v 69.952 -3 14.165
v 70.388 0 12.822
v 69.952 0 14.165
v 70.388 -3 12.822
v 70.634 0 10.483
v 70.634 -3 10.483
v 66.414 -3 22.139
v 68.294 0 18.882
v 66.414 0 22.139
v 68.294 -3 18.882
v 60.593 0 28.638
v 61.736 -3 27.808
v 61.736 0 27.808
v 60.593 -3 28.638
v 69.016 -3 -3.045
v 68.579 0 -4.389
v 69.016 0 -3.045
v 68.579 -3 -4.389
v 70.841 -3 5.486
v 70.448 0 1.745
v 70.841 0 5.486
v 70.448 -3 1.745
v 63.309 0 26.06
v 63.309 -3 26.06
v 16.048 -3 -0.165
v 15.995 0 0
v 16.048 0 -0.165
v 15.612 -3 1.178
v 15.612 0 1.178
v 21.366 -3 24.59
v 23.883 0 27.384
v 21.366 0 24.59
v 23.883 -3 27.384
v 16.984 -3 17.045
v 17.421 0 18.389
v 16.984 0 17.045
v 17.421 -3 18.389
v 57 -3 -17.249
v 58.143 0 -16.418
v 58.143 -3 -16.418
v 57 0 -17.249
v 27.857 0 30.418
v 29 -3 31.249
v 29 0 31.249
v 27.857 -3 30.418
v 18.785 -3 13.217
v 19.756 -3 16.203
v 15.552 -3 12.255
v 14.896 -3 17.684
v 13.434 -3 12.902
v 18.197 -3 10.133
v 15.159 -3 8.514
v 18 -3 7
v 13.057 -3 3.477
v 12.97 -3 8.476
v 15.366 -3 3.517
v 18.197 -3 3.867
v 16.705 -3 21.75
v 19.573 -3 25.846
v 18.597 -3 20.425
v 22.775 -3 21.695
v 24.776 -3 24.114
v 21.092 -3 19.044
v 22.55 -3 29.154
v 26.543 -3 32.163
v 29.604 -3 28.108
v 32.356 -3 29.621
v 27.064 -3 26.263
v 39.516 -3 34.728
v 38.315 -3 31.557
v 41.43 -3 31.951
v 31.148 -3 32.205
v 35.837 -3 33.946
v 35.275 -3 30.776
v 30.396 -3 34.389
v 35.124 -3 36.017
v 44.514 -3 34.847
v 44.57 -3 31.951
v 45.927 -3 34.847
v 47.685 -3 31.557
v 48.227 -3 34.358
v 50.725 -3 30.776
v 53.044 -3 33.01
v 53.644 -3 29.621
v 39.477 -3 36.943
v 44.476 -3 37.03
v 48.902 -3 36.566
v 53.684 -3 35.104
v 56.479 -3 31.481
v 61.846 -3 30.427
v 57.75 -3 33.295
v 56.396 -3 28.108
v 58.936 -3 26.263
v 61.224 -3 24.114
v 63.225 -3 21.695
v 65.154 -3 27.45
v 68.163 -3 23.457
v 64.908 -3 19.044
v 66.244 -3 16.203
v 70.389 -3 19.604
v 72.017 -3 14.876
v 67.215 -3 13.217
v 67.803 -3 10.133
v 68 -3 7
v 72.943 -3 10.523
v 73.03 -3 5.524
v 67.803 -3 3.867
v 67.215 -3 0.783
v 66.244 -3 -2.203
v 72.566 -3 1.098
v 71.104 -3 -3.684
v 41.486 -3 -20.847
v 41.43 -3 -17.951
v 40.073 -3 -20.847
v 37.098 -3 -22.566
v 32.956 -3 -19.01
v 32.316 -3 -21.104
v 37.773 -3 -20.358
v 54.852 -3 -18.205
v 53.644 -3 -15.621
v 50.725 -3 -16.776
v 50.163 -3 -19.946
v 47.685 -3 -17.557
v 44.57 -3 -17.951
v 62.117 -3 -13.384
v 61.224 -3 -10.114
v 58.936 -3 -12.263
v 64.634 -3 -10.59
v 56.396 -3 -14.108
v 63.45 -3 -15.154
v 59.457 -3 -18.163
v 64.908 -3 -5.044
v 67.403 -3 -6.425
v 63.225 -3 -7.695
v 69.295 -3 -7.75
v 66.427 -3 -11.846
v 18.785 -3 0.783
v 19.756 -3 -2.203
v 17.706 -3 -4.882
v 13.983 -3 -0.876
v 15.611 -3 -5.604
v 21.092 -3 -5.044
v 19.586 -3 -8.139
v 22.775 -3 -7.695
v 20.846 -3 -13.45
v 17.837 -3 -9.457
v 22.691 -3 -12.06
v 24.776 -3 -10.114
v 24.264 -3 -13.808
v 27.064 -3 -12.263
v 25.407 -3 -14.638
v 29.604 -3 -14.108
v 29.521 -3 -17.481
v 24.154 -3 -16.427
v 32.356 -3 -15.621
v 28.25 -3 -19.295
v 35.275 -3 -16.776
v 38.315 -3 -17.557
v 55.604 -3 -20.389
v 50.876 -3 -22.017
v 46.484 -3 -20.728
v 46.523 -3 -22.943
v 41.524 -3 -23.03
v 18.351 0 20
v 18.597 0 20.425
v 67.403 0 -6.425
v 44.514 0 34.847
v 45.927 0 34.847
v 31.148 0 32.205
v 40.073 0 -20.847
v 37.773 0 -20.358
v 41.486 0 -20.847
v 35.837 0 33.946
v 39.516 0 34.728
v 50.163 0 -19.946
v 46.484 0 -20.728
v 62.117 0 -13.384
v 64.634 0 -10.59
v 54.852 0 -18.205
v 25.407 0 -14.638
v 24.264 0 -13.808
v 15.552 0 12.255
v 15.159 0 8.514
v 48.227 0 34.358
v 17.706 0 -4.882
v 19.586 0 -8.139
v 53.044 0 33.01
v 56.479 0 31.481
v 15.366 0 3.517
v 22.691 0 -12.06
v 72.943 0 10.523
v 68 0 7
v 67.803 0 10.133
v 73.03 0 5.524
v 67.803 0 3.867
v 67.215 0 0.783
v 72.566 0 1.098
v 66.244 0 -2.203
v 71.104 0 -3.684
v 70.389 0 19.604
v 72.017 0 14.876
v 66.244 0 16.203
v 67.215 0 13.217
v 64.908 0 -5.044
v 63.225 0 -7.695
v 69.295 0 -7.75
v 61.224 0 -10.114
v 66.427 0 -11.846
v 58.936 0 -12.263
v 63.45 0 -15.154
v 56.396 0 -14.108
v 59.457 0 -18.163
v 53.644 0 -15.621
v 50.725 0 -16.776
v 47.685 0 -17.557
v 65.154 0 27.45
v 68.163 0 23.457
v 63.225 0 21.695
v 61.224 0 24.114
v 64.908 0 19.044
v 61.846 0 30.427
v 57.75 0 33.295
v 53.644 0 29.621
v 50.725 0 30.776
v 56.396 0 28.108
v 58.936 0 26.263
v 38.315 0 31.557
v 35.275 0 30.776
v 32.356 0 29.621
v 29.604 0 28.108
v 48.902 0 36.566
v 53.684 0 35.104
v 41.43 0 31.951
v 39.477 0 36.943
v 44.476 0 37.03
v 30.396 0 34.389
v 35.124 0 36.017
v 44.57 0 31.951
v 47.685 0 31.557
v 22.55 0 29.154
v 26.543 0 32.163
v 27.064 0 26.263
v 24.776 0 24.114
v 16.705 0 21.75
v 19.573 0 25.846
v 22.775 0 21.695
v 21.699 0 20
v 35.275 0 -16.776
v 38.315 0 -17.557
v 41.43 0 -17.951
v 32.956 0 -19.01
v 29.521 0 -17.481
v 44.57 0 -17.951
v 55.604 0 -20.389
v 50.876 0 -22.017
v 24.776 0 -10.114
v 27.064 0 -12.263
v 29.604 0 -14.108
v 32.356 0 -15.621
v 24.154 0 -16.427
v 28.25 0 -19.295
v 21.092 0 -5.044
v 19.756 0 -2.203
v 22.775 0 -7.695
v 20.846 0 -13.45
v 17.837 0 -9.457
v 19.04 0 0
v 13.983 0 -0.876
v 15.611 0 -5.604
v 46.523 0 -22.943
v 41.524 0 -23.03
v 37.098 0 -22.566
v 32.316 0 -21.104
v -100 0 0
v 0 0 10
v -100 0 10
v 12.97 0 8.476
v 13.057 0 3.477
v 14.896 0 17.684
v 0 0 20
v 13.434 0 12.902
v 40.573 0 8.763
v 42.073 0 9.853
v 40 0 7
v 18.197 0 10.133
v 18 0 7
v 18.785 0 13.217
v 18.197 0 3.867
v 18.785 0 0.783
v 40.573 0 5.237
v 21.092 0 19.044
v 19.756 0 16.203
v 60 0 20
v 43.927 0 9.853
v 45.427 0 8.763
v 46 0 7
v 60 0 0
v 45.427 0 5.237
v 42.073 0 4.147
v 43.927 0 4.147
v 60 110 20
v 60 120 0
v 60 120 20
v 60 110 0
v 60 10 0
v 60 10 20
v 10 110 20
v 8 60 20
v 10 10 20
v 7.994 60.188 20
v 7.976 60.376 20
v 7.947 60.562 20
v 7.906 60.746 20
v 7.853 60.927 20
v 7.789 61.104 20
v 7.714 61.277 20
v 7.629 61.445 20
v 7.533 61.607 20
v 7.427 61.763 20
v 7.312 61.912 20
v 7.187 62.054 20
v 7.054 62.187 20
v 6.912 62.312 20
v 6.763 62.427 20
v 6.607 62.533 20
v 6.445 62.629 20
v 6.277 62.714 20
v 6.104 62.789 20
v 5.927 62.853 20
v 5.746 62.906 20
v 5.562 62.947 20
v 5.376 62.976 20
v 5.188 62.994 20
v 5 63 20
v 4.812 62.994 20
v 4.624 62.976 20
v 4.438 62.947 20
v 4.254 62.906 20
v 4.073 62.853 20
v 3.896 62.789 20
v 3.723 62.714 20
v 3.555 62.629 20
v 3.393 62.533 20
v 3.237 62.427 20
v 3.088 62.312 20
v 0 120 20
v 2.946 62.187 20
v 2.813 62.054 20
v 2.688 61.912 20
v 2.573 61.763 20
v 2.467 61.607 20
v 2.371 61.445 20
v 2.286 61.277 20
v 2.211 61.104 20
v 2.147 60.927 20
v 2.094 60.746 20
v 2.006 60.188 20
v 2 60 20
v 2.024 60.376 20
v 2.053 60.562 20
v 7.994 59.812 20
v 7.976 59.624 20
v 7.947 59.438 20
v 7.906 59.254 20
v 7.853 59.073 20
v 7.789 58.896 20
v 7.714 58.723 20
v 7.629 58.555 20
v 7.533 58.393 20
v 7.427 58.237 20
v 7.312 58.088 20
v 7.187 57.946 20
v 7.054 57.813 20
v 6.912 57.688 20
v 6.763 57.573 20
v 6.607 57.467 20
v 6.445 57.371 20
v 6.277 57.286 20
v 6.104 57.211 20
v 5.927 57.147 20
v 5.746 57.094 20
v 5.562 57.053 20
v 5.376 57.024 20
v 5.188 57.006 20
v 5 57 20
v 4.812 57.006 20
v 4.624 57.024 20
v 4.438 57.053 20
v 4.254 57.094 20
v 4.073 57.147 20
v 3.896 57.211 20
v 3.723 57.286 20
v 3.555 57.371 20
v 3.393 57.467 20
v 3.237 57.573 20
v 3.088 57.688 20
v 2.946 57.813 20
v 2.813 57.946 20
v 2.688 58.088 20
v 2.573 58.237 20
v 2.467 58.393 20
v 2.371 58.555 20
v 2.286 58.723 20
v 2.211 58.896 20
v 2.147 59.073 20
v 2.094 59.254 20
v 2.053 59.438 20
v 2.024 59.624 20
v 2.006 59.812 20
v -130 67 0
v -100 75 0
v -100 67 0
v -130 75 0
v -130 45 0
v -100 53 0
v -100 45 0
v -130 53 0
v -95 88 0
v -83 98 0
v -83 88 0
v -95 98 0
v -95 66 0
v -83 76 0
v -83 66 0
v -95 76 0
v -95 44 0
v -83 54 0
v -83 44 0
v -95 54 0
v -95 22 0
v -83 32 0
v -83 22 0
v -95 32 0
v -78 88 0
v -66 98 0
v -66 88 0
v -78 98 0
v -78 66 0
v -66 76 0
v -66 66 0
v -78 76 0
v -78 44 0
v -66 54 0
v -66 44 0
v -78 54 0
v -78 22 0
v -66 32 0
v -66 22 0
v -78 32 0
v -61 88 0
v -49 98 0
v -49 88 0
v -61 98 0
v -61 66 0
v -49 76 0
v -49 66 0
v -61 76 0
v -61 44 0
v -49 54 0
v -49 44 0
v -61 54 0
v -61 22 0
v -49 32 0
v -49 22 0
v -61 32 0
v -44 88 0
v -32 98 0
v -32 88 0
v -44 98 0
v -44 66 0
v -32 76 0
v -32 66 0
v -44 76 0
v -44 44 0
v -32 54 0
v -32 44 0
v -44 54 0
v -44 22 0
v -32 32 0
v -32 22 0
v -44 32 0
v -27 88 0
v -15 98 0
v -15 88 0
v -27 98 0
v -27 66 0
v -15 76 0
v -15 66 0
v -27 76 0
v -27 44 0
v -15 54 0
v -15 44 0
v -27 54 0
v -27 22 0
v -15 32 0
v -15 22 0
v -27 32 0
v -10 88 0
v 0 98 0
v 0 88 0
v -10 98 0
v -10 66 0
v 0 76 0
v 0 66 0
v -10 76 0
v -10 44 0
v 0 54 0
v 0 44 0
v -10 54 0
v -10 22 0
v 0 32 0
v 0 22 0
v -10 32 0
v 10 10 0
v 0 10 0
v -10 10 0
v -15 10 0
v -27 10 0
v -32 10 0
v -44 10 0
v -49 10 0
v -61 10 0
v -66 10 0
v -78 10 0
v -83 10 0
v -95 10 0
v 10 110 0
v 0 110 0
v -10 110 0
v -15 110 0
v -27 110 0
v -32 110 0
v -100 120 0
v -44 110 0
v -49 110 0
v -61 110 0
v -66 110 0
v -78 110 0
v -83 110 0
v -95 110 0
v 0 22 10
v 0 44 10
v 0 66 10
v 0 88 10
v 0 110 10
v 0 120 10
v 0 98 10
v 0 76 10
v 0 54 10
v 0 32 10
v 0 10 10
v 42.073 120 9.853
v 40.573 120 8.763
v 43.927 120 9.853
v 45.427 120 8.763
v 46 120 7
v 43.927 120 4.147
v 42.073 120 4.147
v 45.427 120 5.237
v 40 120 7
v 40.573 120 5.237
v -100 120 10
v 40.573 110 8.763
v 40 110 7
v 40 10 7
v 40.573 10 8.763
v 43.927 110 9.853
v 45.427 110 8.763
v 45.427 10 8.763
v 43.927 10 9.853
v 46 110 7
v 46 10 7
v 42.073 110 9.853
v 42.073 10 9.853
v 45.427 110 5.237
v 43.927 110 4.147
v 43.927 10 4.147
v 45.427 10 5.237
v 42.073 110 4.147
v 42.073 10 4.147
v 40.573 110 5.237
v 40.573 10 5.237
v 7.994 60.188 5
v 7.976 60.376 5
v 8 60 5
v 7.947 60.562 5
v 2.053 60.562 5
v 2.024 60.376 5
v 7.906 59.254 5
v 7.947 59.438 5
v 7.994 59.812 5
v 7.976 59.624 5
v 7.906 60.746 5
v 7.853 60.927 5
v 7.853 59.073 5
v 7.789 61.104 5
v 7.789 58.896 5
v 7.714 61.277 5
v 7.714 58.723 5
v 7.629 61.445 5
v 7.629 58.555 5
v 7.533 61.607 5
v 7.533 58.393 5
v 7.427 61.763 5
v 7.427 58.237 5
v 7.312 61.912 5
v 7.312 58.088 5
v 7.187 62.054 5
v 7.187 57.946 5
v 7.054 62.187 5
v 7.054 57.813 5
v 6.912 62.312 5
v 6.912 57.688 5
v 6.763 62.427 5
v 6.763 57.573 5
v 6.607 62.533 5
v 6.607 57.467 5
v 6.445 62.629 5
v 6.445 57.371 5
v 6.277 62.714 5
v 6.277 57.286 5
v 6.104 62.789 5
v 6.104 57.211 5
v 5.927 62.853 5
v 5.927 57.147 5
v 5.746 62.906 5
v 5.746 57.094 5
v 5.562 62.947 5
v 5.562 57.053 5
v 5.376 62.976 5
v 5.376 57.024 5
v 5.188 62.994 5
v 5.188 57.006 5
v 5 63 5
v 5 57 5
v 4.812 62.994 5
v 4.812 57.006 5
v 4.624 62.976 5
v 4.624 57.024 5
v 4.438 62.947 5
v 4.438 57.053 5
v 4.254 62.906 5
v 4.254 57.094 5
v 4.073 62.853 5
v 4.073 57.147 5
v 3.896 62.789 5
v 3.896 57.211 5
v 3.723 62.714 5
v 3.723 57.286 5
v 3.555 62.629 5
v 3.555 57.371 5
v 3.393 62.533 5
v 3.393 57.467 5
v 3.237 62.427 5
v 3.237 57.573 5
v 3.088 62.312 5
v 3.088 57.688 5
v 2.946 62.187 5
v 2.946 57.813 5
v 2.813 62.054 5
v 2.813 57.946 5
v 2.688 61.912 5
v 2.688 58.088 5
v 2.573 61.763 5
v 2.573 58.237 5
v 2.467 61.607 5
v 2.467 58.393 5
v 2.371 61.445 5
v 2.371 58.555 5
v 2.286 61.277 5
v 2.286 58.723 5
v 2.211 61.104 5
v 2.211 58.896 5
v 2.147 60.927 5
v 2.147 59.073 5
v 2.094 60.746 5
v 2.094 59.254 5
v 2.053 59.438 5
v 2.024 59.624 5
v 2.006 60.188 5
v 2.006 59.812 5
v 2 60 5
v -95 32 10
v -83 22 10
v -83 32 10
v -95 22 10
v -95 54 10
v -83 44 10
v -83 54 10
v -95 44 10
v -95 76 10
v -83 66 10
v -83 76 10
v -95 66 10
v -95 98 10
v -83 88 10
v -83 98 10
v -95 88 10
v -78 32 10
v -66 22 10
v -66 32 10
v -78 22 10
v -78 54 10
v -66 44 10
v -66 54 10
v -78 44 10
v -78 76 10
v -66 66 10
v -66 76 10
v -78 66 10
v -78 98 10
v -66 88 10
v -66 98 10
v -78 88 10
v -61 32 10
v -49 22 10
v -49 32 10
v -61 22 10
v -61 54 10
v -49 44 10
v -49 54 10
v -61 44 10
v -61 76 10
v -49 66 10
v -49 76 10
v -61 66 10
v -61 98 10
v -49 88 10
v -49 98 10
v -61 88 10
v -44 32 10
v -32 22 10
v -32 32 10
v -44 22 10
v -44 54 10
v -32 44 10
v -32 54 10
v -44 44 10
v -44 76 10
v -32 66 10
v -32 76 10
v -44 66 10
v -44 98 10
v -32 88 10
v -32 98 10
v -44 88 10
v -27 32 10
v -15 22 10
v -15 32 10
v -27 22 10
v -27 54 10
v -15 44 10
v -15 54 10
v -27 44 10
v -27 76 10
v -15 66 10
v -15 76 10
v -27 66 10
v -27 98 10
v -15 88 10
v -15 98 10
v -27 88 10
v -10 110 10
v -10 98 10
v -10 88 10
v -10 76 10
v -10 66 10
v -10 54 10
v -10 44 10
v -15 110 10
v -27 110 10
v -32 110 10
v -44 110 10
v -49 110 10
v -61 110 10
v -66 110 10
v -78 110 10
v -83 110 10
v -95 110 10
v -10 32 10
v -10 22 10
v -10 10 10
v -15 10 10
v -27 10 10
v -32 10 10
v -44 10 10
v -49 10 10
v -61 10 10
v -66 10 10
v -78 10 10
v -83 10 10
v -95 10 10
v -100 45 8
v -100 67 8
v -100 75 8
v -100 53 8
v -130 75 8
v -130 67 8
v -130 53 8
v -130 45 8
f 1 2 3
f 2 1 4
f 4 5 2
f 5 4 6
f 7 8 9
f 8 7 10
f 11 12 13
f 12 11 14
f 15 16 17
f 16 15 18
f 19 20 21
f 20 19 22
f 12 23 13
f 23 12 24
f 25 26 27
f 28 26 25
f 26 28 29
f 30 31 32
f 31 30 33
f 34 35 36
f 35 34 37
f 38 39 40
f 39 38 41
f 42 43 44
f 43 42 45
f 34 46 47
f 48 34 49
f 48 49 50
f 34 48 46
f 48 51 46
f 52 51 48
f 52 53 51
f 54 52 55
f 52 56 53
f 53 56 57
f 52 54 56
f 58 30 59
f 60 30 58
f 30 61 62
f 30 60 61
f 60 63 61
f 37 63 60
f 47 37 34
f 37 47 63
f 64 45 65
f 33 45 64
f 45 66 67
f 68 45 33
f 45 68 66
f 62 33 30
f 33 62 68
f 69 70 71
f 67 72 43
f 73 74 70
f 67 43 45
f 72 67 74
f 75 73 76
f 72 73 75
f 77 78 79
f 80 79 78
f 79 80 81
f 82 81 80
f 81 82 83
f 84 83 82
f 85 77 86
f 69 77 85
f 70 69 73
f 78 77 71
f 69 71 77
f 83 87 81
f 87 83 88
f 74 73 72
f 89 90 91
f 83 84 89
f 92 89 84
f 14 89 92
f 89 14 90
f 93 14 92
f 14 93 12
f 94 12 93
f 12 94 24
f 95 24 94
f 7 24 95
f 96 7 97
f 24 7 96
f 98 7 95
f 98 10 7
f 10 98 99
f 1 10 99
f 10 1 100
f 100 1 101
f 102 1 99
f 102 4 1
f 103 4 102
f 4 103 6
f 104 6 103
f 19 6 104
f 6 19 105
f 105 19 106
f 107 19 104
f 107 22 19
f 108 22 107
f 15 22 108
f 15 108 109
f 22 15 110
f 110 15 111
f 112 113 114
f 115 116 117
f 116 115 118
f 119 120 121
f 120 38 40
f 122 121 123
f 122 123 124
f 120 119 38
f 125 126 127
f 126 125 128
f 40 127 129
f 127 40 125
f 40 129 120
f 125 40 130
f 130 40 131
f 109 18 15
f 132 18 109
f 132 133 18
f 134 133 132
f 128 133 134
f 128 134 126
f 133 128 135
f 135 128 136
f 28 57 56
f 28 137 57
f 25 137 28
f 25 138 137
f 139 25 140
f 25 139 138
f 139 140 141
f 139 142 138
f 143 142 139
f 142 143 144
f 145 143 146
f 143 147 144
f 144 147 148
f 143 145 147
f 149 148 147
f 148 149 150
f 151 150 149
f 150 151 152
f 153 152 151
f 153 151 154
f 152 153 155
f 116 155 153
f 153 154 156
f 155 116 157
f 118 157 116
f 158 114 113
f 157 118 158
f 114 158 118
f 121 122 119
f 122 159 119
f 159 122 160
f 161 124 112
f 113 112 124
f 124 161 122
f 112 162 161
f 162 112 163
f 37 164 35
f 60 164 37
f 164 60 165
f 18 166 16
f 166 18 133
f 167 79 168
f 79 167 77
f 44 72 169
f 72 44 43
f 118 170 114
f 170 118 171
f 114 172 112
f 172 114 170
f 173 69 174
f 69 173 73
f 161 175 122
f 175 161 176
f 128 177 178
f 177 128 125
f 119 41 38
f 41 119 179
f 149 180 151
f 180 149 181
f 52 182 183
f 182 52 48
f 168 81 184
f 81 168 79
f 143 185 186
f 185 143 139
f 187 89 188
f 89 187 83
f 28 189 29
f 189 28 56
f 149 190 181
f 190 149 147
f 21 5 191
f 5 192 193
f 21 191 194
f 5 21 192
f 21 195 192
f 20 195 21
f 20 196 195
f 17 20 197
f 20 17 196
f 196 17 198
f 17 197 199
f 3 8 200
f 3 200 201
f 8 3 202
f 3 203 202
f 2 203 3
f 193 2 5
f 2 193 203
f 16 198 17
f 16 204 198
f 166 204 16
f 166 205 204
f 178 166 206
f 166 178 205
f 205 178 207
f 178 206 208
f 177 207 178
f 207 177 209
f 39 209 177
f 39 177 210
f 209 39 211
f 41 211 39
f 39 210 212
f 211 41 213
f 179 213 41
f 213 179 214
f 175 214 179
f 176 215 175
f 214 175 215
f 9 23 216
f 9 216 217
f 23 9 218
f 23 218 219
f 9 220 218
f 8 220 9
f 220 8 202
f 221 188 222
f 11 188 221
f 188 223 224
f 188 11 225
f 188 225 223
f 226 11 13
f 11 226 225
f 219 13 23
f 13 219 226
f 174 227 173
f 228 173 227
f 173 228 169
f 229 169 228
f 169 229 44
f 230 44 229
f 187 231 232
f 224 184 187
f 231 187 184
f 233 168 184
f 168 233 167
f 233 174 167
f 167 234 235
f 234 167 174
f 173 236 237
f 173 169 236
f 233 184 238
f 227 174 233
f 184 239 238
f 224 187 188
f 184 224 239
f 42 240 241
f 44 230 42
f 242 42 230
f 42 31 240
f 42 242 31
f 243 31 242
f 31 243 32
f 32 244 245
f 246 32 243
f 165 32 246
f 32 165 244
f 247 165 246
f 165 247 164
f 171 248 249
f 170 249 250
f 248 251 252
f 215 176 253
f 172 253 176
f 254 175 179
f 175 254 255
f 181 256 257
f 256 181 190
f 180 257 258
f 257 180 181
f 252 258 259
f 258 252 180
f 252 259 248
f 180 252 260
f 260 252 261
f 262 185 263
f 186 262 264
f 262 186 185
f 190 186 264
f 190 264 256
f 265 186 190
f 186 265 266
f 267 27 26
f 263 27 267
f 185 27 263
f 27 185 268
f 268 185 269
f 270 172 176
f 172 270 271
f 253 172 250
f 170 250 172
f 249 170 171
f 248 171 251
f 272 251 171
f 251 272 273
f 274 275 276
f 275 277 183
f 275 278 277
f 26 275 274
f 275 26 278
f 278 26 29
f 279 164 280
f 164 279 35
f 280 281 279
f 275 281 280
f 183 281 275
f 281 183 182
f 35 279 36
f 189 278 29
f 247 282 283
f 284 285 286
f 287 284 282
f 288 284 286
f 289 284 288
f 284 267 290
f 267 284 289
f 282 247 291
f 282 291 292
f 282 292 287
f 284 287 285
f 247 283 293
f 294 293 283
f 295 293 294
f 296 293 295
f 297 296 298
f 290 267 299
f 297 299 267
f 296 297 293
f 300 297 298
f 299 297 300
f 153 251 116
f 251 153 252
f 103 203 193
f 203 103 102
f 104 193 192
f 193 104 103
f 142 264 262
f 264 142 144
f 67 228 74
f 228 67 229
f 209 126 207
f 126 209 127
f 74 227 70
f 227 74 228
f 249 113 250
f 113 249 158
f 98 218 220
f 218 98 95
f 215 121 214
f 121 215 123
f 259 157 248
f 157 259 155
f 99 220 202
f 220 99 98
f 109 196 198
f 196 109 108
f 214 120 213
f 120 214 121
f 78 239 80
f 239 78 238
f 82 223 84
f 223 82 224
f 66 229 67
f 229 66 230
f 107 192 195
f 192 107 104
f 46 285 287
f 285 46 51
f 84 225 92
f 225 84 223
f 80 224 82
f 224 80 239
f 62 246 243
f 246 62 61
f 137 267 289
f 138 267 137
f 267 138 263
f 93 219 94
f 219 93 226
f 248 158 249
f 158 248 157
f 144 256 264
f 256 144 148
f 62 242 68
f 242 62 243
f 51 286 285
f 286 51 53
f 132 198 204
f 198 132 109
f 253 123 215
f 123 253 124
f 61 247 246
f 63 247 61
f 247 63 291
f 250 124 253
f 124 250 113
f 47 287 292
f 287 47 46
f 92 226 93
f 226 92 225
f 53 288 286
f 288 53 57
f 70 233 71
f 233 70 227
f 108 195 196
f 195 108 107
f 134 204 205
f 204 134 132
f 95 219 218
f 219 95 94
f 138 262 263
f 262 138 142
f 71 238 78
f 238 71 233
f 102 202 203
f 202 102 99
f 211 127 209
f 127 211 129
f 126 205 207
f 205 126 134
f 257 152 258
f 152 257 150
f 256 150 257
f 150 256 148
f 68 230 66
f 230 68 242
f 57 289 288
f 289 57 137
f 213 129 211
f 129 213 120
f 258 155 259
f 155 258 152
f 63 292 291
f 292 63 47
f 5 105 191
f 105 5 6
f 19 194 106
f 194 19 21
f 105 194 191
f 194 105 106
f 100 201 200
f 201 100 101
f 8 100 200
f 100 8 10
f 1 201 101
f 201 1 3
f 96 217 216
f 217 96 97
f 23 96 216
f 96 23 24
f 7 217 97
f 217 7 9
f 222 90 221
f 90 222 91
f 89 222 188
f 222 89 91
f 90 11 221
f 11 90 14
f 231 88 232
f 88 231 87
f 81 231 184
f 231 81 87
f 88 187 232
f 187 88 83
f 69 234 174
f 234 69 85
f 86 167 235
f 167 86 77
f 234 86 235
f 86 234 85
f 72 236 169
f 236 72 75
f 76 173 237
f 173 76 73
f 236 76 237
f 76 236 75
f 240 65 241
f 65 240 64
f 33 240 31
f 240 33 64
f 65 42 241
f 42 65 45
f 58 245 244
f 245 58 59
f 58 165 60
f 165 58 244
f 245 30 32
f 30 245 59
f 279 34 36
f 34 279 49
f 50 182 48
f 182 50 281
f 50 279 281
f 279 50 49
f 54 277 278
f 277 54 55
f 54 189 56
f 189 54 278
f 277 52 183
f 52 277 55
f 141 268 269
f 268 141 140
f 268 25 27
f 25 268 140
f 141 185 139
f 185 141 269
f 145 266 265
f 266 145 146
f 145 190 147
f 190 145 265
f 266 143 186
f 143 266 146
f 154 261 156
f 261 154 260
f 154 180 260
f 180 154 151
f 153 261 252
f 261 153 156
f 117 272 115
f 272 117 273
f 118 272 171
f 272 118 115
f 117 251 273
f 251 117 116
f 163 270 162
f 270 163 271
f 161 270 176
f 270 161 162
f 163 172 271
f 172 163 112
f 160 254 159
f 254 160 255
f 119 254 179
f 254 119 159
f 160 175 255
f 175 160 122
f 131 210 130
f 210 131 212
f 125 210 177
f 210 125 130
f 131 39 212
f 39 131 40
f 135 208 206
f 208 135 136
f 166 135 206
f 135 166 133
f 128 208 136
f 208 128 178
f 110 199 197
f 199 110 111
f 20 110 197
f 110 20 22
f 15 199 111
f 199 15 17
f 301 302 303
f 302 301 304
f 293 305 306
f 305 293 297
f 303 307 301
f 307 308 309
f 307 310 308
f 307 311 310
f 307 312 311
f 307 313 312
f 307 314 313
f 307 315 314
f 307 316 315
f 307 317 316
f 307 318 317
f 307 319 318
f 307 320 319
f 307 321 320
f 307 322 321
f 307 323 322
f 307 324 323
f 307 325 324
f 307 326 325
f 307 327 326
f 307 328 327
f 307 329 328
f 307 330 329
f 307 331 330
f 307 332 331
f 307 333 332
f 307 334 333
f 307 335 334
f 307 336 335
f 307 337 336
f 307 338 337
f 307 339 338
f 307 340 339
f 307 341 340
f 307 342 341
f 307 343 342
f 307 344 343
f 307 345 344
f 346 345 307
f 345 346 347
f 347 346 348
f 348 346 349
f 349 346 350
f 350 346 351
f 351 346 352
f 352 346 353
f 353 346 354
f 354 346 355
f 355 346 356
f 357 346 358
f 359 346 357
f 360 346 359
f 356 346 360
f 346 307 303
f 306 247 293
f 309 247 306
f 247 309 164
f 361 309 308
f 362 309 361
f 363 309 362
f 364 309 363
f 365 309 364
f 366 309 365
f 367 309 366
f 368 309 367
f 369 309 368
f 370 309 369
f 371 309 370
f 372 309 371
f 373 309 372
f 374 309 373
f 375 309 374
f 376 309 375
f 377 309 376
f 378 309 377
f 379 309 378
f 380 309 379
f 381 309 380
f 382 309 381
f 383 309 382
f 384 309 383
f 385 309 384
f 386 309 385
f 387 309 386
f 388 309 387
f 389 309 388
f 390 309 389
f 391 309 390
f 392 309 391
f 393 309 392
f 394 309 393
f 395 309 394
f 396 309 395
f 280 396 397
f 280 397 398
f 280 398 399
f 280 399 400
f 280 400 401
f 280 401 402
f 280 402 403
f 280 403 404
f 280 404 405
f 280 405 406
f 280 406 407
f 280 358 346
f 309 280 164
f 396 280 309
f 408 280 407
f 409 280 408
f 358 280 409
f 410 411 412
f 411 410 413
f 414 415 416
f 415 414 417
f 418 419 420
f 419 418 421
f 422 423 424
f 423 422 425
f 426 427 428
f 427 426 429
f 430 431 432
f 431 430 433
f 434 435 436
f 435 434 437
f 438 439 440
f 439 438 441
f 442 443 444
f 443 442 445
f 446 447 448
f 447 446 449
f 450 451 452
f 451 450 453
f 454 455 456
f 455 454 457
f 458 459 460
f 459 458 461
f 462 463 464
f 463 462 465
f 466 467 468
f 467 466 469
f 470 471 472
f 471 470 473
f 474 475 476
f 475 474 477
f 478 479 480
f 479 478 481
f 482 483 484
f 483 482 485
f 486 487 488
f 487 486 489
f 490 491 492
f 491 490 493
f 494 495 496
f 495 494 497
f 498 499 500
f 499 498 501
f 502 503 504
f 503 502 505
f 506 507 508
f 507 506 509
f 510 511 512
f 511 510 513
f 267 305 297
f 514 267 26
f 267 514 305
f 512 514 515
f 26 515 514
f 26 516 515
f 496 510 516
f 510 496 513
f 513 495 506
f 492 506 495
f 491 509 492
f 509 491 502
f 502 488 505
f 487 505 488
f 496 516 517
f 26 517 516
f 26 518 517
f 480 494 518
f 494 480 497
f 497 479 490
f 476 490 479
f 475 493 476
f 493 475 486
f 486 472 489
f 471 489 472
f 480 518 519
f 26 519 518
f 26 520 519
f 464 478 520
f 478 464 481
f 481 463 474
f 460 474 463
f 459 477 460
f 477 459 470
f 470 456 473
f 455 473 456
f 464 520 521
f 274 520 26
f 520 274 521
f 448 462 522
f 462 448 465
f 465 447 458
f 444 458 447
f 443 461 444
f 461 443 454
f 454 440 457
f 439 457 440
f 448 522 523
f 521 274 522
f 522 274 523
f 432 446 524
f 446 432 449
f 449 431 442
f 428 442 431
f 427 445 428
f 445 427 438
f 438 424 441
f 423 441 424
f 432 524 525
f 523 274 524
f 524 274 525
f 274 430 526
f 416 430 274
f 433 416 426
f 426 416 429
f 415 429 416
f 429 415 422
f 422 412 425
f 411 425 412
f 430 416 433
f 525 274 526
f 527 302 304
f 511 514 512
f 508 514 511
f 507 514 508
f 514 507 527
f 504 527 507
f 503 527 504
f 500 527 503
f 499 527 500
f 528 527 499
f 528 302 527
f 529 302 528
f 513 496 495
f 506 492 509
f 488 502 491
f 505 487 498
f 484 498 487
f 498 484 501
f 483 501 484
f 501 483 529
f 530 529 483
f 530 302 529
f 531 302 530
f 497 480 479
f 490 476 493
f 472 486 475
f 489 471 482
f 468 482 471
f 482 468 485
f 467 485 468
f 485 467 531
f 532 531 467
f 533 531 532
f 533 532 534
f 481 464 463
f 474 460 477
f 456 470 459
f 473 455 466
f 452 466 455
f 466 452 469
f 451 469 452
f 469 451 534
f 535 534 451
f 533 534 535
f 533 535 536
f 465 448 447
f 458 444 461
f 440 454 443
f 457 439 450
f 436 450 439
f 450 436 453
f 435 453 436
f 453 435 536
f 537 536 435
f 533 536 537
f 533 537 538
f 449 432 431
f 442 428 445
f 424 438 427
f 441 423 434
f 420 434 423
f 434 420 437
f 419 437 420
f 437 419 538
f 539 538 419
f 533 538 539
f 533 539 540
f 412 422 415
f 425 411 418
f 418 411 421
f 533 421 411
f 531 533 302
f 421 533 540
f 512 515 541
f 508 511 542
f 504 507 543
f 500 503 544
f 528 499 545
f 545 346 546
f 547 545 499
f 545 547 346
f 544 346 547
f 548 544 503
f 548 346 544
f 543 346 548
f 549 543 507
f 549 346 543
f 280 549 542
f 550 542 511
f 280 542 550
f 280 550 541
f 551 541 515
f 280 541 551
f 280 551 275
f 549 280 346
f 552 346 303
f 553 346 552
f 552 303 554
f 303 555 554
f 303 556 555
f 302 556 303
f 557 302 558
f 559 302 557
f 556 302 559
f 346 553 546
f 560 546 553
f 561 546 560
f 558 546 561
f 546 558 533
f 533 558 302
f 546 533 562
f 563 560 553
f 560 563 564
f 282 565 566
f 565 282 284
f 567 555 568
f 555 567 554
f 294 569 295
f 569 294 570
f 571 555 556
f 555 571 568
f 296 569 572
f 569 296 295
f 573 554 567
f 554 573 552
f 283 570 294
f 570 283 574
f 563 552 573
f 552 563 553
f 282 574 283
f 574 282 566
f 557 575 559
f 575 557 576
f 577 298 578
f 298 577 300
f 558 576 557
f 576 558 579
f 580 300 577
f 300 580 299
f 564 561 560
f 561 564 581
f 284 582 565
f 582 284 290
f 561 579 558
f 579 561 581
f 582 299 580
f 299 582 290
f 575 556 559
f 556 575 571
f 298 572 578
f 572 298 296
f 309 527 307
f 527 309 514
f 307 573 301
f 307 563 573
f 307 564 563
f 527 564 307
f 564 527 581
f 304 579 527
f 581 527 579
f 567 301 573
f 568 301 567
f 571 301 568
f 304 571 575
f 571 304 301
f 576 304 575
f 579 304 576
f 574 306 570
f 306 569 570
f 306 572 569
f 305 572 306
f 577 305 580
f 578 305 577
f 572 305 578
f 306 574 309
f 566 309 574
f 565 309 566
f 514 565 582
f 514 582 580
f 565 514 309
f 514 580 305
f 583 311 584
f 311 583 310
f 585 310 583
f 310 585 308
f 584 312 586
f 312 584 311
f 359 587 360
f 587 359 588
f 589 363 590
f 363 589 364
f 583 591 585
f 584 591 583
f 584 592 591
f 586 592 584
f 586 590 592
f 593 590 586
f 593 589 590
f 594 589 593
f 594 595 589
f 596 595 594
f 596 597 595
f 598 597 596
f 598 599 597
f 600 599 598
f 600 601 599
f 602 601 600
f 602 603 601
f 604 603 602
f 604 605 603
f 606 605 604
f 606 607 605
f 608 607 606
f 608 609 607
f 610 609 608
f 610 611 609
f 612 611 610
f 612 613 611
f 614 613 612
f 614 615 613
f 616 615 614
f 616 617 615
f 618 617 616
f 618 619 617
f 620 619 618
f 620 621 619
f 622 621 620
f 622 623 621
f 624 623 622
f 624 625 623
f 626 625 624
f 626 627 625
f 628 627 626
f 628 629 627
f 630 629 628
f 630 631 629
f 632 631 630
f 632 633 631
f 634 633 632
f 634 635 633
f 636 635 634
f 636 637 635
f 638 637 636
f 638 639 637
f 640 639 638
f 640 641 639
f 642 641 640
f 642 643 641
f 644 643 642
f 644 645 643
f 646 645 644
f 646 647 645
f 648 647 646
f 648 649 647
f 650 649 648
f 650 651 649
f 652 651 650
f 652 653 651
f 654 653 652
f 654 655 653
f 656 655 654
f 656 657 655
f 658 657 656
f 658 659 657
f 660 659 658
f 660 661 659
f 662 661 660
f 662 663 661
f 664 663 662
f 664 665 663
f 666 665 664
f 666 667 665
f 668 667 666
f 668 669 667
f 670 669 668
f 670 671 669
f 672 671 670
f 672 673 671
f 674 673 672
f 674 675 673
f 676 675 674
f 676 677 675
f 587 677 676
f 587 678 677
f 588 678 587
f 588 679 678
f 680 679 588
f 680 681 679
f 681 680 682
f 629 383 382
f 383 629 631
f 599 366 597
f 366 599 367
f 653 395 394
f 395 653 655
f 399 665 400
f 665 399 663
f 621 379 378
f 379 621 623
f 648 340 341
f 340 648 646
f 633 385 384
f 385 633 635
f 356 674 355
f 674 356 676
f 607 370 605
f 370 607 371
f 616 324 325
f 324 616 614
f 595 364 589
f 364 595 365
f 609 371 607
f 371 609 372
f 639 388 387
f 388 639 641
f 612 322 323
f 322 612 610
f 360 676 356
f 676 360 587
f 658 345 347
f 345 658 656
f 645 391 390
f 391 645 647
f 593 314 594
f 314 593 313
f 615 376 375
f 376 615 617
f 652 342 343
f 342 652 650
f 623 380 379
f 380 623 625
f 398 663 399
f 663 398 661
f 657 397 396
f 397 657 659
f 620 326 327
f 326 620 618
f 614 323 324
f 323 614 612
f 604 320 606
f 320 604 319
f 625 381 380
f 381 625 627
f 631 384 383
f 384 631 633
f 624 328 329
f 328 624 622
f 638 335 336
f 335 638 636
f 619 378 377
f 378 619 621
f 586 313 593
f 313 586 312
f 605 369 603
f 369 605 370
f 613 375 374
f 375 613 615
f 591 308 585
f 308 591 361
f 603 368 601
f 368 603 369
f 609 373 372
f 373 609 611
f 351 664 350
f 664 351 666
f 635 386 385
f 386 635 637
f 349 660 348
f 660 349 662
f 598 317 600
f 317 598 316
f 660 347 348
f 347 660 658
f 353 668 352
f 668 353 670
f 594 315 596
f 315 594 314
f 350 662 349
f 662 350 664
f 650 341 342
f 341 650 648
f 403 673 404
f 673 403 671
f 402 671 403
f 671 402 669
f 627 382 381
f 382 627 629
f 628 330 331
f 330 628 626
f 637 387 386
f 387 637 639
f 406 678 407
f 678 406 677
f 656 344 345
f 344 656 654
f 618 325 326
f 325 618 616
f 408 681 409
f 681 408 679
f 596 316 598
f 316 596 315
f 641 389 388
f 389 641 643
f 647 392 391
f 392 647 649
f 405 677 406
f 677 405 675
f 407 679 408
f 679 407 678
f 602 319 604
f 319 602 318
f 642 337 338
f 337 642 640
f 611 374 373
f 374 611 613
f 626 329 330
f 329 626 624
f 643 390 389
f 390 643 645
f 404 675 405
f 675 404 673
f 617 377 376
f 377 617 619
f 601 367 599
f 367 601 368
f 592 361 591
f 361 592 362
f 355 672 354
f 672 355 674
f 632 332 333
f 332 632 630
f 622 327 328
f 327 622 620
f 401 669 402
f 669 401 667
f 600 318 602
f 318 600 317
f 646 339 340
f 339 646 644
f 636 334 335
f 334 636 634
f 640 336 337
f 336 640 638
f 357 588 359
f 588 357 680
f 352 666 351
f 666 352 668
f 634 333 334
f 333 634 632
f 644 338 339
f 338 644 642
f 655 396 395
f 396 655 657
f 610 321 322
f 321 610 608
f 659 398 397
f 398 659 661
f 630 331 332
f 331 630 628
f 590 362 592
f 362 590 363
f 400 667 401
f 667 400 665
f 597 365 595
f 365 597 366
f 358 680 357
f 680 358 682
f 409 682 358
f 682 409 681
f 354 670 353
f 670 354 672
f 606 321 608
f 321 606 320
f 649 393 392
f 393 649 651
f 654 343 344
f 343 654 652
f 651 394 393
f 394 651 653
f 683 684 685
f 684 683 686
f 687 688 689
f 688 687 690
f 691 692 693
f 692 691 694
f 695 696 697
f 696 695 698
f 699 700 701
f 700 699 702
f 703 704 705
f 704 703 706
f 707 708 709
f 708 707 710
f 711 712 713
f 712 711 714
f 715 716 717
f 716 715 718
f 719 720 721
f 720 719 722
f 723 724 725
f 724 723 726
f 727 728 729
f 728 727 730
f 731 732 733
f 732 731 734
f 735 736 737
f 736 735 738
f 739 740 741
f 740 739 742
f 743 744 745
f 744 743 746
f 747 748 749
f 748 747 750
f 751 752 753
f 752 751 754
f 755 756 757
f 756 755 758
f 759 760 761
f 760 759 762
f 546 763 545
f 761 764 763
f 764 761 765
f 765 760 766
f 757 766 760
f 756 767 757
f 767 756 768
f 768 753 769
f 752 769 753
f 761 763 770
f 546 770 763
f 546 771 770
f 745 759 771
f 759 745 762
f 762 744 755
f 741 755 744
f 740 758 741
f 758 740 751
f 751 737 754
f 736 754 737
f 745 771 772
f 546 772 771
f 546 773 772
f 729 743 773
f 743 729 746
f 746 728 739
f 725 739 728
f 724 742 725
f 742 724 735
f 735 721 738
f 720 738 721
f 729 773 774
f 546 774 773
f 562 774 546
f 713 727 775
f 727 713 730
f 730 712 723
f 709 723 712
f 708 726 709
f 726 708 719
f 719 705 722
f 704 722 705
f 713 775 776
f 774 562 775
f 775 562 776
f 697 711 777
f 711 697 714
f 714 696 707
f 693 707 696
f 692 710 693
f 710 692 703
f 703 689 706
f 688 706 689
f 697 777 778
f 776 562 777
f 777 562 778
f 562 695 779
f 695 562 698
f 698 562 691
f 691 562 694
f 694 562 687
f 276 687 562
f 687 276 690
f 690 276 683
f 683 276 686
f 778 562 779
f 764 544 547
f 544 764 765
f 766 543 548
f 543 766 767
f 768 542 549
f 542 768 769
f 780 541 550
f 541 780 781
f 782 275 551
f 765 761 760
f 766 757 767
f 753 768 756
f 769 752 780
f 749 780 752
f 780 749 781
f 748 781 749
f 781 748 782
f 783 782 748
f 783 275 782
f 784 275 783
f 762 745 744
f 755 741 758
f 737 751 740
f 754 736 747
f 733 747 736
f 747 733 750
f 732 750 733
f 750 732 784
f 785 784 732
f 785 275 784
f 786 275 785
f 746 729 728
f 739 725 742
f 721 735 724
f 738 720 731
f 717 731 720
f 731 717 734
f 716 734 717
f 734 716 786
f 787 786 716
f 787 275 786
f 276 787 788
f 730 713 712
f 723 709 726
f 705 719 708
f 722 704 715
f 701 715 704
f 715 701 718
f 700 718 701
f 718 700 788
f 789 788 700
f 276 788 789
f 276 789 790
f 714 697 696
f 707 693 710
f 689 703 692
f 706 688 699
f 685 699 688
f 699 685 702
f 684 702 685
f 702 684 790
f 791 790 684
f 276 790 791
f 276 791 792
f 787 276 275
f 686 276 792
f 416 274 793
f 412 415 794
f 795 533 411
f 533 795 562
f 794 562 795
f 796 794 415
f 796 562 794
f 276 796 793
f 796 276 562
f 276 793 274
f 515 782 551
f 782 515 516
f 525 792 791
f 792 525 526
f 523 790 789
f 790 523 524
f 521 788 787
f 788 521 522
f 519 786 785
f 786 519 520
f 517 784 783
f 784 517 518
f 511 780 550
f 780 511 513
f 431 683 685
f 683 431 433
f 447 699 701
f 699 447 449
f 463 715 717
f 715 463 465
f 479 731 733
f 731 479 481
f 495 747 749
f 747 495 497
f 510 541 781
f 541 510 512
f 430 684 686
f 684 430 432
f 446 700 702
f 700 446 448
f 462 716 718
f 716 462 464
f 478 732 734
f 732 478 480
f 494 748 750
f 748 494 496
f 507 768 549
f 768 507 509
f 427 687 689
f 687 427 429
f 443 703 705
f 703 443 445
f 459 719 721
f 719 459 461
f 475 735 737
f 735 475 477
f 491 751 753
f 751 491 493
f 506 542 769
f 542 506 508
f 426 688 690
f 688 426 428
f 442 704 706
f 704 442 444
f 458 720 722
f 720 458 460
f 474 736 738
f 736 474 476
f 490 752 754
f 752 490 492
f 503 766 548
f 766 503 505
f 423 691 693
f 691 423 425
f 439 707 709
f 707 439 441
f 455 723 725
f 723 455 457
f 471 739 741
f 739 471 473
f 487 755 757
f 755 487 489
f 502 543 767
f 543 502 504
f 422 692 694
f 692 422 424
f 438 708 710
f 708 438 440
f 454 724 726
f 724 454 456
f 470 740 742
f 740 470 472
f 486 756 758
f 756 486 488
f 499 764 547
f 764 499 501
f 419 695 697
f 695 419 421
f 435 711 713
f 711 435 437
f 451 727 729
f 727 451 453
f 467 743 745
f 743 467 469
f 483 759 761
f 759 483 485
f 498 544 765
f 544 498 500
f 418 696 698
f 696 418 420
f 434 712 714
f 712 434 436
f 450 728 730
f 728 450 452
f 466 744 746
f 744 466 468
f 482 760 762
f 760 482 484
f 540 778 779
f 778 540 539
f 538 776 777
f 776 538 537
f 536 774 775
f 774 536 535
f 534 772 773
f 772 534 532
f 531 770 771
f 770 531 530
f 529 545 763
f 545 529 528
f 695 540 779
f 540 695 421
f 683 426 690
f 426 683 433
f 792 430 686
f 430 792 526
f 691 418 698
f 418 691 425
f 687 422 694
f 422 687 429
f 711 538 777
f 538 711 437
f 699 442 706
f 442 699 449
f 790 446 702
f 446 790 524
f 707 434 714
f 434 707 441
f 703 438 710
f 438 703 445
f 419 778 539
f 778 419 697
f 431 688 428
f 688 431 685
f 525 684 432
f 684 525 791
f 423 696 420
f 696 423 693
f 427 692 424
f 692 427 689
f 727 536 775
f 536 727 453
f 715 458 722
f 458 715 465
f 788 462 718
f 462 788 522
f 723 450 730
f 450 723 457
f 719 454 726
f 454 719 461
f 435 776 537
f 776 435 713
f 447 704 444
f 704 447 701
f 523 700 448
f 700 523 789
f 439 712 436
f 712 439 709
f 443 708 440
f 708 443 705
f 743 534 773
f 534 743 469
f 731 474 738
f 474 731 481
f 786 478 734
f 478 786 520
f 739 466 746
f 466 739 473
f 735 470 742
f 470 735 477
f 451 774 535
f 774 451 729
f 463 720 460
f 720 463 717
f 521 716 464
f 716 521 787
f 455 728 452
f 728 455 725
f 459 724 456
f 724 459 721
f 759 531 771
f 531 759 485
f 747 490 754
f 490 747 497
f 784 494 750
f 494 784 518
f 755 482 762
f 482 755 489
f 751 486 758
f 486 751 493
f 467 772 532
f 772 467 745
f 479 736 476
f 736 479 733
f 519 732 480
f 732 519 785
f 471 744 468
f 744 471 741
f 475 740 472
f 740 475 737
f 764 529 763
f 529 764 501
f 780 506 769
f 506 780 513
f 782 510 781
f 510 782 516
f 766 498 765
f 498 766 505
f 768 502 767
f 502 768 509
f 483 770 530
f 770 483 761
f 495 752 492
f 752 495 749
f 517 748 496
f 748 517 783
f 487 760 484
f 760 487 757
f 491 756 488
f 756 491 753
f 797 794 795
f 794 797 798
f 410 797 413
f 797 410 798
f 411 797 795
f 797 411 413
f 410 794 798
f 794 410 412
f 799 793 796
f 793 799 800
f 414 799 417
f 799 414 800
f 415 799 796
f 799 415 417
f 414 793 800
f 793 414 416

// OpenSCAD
/*
translate([9,130,-5]){
    scale([1,10,1]){
        rotate([90,0,0]){

            import("axle2.stl", convexity=3);
        }
    }

}
*/
translate([43,0,7]){
    //cube(10,3,3)
    rotate([90,0,0]){
        difference(){
            cylinder(3,28,28);
               cylinder(5,25,25, $fn=50);
            }
        for ( i = [1:18:360]) {    
            rotate([0,0,i]){
            translate([25,-2,0]){    
            cube([5,5,3]);
            }
        }
        }
    }
}


difference(){
    cube([60,120,20]);
    translate([43,125,7]){
        rotate([90,0,0]){
            cylinder(150, 3, 3);
        }
    }
    translate([10,10,-5]){
        cube([60,100,30]);
    }

    translate([5,60,5]){
        cylinder(150, 3, 3, $fn=100);
    }
    
}


translate([-100,0,0]){
    for (a =[0:5]){  
        translate([0,a*22,0]){
        cube([100,10,10]);
        }
    }
}


translate([-100,0,0]){
    for (a =[0:5]){  
        translate([a*17,0,0]){
            cube([5,110 ,10]);
        }
    }
}

translate([-130,67,0])
    cube([30,8,8]);
    
    translate([-130,45,0])
        cube([30,8,8]);
